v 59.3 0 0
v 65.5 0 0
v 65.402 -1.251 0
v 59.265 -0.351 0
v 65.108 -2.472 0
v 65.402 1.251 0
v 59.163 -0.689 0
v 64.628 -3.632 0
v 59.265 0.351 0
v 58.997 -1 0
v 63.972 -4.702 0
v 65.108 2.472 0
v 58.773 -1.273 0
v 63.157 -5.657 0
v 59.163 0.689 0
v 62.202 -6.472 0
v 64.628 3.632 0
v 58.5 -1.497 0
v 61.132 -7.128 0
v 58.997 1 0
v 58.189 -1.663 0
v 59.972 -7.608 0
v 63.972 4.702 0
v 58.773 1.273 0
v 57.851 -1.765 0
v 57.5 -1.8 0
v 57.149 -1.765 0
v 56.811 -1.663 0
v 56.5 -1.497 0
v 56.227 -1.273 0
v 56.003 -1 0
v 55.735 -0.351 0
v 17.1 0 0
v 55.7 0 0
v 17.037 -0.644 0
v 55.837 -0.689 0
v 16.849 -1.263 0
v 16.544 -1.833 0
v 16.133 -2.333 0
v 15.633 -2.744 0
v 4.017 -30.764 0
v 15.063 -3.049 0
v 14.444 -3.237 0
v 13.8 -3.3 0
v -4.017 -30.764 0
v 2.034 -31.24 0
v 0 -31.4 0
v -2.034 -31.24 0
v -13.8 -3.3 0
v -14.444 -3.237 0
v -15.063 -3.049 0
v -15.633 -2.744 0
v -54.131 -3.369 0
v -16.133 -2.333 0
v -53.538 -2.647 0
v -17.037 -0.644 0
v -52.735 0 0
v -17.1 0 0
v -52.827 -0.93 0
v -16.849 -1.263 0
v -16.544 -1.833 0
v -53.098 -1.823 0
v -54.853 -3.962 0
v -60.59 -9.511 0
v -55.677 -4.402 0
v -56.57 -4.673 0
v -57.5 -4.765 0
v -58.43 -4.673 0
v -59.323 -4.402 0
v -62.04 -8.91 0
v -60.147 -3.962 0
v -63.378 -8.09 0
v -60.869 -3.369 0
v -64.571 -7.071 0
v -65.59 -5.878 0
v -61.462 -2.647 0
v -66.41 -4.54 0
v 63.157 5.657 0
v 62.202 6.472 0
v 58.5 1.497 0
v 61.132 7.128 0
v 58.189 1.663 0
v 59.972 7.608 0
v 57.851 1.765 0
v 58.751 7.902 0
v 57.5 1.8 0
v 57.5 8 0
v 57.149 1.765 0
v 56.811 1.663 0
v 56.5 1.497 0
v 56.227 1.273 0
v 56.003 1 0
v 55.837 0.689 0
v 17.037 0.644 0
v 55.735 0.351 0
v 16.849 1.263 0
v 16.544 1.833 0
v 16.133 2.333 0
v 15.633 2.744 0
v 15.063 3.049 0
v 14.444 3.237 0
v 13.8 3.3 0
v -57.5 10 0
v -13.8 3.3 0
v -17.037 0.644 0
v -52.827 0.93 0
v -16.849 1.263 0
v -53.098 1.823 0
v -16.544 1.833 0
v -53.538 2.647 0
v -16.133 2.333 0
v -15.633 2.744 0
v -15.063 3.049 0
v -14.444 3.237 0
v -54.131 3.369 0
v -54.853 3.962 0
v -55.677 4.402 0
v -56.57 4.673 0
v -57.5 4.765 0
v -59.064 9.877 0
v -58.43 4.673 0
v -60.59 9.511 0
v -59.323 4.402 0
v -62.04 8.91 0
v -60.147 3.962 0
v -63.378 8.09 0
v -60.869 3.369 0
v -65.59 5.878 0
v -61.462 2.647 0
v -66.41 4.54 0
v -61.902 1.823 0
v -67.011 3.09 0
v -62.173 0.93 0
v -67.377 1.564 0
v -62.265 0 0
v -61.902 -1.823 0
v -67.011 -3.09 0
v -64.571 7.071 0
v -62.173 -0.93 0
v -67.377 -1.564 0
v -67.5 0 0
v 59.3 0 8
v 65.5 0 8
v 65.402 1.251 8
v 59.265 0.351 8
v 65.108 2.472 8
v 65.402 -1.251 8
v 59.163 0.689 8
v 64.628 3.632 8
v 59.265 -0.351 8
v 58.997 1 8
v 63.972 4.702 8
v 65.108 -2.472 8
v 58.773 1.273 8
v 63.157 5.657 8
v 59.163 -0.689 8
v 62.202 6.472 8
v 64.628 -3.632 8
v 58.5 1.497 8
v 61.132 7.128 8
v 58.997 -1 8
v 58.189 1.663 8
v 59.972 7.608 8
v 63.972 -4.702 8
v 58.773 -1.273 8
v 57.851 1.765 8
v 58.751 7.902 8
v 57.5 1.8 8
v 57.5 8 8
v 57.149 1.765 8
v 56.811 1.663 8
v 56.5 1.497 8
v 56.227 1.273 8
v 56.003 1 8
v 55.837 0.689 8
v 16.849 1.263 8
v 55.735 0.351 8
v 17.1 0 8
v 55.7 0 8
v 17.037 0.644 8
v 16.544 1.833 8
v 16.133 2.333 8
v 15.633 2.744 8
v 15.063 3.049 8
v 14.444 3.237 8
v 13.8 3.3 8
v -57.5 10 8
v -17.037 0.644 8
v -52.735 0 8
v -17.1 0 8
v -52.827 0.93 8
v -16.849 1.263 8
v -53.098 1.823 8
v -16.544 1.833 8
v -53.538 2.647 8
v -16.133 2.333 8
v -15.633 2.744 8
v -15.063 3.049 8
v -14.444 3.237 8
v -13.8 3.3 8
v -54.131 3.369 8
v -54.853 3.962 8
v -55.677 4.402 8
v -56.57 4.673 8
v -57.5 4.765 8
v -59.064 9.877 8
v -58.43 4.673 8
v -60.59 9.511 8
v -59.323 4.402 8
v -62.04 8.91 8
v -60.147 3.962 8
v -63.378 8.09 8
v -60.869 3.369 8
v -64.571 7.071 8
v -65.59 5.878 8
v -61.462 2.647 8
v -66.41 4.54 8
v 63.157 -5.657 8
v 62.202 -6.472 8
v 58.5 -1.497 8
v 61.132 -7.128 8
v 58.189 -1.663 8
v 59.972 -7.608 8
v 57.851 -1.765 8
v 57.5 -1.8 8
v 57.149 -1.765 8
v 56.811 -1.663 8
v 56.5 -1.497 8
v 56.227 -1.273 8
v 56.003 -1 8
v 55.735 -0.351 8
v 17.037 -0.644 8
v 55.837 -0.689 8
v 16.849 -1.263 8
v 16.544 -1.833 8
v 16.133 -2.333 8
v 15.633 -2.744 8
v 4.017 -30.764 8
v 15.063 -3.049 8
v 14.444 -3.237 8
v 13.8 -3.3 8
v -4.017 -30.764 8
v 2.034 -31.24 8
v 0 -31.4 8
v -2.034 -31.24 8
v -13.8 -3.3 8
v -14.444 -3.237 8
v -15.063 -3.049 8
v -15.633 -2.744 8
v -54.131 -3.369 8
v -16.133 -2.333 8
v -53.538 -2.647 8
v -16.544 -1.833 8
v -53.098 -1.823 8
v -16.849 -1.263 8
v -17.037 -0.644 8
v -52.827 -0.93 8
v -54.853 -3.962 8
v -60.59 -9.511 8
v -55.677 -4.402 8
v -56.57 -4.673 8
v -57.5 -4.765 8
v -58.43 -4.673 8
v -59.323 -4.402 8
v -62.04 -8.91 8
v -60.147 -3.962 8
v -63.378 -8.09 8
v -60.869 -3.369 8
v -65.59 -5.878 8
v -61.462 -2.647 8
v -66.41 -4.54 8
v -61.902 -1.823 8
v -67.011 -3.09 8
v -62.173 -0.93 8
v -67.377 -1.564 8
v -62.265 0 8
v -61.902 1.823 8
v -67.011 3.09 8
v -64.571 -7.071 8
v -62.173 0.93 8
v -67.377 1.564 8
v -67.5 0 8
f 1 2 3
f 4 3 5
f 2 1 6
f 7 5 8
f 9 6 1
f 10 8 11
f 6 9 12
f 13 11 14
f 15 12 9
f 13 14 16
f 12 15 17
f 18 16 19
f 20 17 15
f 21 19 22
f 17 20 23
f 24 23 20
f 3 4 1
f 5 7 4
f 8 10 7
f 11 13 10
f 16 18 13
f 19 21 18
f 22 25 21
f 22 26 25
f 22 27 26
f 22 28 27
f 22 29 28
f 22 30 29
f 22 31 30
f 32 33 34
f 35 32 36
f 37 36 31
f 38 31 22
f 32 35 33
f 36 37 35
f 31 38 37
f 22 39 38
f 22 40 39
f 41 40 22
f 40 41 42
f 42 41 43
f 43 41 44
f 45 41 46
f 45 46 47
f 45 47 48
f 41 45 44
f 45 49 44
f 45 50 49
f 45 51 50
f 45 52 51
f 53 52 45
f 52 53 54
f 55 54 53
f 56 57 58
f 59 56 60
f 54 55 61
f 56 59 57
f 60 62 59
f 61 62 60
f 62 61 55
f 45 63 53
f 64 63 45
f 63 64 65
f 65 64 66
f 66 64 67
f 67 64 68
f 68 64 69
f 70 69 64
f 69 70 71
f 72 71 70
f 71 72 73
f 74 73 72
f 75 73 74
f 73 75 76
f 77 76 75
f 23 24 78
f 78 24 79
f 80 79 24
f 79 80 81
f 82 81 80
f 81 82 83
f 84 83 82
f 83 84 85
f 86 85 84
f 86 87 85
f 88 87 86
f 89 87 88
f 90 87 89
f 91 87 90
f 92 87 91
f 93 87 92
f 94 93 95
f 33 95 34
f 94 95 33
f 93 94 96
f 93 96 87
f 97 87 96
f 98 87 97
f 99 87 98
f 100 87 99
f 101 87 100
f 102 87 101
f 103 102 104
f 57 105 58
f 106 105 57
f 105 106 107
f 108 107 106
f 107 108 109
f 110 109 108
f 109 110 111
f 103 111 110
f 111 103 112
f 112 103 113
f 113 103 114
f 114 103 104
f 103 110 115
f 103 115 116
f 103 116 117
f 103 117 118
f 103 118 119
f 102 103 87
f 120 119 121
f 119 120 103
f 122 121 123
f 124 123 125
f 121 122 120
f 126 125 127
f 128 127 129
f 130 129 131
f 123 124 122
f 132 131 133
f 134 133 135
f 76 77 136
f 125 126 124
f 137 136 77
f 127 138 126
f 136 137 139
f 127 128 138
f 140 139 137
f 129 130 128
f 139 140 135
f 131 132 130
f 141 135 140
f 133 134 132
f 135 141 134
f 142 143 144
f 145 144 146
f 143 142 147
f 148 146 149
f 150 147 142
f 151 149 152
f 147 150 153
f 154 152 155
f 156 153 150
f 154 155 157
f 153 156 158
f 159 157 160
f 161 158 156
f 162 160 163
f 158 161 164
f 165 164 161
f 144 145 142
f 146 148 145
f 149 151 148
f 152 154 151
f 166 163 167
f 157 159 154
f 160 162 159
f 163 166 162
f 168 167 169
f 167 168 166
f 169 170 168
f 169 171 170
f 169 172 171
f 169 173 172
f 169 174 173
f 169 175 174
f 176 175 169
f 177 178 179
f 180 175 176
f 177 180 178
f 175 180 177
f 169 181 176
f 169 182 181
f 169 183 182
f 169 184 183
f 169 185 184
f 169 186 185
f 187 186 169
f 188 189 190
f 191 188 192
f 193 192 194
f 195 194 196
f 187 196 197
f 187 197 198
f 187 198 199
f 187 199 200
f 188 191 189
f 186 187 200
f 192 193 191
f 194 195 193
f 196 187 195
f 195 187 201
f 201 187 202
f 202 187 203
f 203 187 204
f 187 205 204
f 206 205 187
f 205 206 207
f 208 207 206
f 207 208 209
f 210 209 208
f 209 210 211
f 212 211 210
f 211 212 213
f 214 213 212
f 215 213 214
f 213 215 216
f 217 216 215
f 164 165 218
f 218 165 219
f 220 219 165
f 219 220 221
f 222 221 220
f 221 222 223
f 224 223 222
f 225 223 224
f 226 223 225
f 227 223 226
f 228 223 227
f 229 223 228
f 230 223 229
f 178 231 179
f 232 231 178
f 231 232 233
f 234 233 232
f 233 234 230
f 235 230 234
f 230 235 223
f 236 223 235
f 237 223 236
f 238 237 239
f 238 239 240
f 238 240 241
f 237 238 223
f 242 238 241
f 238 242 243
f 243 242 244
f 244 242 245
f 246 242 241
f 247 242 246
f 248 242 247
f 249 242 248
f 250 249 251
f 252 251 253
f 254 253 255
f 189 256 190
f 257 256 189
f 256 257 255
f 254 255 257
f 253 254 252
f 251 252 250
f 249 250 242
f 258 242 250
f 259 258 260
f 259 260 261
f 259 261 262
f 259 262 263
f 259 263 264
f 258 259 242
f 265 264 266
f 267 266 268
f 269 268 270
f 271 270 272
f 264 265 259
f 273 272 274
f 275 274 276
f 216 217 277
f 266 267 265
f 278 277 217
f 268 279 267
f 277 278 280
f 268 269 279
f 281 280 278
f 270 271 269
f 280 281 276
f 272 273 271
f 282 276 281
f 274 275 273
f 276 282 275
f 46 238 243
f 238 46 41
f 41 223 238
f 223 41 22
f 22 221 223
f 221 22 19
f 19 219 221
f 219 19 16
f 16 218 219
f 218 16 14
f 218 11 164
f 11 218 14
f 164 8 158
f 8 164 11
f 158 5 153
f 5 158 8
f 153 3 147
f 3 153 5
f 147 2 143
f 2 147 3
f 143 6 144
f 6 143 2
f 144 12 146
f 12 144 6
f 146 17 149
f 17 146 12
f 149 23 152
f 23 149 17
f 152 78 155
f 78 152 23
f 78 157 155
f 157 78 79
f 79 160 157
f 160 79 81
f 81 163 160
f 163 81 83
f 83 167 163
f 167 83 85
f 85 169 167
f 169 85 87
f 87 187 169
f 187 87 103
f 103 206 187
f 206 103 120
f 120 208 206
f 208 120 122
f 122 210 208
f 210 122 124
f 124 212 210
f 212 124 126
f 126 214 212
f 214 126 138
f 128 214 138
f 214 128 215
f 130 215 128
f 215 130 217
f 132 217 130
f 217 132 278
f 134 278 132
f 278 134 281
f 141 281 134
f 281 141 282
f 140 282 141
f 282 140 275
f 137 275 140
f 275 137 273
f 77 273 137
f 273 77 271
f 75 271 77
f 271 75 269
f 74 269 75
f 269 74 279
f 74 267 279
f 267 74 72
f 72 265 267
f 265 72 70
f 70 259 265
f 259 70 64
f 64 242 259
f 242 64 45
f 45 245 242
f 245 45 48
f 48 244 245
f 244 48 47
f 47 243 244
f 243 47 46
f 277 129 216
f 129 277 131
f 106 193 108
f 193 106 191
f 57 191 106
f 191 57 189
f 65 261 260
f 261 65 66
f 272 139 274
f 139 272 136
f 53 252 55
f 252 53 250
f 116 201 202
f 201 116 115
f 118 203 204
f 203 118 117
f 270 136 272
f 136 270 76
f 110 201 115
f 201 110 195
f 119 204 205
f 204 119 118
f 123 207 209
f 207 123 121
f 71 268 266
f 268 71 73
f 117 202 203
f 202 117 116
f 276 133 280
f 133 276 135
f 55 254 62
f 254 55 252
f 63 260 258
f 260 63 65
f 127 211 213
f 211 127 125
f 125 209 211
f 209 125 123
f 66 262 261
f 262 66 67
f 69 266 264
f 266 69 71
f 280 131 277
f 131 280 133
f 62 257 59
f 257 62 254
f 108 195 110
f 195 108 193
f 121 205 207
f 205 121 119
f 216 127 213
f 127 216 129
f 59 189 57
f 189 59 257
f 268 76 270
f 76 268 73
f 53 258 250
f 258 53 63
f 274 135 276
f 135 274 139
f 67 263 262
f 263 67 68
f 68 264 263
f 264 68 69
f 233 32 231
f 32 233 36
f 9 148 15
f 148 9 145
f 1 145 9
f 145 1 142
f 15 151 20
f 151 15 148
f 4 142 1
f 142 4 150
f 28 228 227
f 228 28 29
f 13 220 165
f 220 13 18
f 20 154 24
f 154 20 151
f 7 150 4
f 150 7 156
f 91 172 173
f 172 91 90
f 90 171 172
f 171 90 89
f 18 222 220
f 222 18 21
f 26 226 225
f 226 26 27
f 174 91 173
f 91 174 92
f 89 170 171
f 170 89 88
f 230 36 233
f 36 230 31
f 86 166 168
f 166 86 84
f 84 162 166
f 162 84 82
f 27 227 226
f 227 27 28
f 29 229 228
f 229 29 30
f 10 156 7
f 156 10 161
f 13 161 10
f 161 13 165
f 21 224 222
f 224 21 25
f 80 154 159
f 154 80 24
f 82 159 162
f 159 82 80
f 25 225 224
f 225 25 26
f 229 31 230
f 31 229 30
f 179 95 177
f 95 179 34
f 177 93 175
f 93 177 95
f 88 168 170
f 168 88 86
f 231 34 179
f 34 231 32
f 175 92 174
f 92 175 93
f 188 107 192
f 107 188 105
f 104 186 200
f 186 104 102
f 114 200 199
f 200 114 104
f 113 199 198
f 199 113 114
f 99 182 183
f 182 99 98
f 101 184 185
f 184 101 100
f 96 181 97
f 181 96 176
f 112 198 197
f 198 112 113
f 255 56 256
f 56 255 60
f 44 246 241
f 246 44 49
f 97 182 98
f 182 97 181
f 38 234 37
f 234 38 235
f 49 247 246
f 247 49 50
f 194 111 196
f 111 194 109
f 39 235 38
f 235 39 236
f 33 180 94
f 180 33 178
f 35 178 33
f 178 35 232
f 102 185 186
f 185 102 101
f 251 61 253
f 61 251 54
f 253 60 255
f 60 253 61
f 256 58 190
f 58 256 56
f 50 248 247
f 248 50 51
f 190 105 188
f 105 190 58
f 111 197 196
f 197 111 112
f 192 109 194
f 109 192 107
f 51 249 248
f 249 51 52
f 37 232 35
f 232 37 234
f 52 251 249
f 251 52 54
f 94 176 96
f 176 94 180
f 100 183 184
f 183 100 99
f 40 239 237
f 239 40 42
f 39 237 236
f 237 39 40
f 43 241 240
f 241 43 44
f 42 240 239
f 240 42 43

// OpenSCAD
$fn = 32;

// ----------------------------------------------------------------------
// Lever: 115 mm between the bosses, 8 mm thick, smooth outline
// ----------------------------------------------------------------------

// --- parameters (mm) ---
lever_l = 115;            // distance between the boss centres
boss_a = 20;              // first boss diameter
boss_b = 16;              // second boss diameter
bore_a = 9.53;            // first bore
bore_b = 3.6;             // second bore
lever_t = 8;              // lever thickness
boss_c = 26;              // middle boss diameter
bend = 18.4;              // how far the middle boss drops
slot_w = 6.6;             // adjustment slot width

lever_profile = [[-67.5, 0], [-67.377, -1.564], [-67.011, -3.09], [-66.41, -4.54], [-65.59, -5.878], [-64.571, -7.071], [-63.378, -8.09], [-62.04, -8.91], [-60.59, -9.511], [-4.017, -30.764], [-2.034, -31.24], [0, -31.4], [2.034, -31.24], [4.017, -30.764], [59.972, -7.608], [61.132, -7.128], [62.202, -6.472], [63.157, -5.657], [63.972, -4.702], [64.628, -3.632], [65.108, -2.472], [65.402, -1.251], [65.5, 0], [65.402, 1.251], [65.108, 2.472], [64.628, 3.632], [63.972, 4.702], [63.157, 5.657], [62.202, 6.472], [61.132, 7.128], [59.972, 7.608], [58.751, 7.902], [57.5, 8], [-57.5, 10], [-59.064, 9.877], [-60.59, 9.511], [-62.04, 8.91], [-63.378, 8.09], [-64.571, 7.071], [-65.59, 5.878], [-66.41, 4.54], [-67.011, 3.09], [-67.377, 1.564]];

difference() {
  linear_extrude(height = lever_t) polygon(lever_profile);
  translate([-57.5, 0, -2.5]) cylinder(h = lever_t + 5, d = bore_a);
  translate([57.5, 0, -2.5]) cylinder(h = lever_t + 5, d = bore_b);
  /* slotted adjustment, stadium shaped */
  hull() {
    translate([-13.8, 0, -2.5]) cylinder(h = lever_t + 5, d = slot_w);
    translate([13.8, 0, -2.5]) cylinder(h = lever_t + 5, d = slot_w);
  }
}
